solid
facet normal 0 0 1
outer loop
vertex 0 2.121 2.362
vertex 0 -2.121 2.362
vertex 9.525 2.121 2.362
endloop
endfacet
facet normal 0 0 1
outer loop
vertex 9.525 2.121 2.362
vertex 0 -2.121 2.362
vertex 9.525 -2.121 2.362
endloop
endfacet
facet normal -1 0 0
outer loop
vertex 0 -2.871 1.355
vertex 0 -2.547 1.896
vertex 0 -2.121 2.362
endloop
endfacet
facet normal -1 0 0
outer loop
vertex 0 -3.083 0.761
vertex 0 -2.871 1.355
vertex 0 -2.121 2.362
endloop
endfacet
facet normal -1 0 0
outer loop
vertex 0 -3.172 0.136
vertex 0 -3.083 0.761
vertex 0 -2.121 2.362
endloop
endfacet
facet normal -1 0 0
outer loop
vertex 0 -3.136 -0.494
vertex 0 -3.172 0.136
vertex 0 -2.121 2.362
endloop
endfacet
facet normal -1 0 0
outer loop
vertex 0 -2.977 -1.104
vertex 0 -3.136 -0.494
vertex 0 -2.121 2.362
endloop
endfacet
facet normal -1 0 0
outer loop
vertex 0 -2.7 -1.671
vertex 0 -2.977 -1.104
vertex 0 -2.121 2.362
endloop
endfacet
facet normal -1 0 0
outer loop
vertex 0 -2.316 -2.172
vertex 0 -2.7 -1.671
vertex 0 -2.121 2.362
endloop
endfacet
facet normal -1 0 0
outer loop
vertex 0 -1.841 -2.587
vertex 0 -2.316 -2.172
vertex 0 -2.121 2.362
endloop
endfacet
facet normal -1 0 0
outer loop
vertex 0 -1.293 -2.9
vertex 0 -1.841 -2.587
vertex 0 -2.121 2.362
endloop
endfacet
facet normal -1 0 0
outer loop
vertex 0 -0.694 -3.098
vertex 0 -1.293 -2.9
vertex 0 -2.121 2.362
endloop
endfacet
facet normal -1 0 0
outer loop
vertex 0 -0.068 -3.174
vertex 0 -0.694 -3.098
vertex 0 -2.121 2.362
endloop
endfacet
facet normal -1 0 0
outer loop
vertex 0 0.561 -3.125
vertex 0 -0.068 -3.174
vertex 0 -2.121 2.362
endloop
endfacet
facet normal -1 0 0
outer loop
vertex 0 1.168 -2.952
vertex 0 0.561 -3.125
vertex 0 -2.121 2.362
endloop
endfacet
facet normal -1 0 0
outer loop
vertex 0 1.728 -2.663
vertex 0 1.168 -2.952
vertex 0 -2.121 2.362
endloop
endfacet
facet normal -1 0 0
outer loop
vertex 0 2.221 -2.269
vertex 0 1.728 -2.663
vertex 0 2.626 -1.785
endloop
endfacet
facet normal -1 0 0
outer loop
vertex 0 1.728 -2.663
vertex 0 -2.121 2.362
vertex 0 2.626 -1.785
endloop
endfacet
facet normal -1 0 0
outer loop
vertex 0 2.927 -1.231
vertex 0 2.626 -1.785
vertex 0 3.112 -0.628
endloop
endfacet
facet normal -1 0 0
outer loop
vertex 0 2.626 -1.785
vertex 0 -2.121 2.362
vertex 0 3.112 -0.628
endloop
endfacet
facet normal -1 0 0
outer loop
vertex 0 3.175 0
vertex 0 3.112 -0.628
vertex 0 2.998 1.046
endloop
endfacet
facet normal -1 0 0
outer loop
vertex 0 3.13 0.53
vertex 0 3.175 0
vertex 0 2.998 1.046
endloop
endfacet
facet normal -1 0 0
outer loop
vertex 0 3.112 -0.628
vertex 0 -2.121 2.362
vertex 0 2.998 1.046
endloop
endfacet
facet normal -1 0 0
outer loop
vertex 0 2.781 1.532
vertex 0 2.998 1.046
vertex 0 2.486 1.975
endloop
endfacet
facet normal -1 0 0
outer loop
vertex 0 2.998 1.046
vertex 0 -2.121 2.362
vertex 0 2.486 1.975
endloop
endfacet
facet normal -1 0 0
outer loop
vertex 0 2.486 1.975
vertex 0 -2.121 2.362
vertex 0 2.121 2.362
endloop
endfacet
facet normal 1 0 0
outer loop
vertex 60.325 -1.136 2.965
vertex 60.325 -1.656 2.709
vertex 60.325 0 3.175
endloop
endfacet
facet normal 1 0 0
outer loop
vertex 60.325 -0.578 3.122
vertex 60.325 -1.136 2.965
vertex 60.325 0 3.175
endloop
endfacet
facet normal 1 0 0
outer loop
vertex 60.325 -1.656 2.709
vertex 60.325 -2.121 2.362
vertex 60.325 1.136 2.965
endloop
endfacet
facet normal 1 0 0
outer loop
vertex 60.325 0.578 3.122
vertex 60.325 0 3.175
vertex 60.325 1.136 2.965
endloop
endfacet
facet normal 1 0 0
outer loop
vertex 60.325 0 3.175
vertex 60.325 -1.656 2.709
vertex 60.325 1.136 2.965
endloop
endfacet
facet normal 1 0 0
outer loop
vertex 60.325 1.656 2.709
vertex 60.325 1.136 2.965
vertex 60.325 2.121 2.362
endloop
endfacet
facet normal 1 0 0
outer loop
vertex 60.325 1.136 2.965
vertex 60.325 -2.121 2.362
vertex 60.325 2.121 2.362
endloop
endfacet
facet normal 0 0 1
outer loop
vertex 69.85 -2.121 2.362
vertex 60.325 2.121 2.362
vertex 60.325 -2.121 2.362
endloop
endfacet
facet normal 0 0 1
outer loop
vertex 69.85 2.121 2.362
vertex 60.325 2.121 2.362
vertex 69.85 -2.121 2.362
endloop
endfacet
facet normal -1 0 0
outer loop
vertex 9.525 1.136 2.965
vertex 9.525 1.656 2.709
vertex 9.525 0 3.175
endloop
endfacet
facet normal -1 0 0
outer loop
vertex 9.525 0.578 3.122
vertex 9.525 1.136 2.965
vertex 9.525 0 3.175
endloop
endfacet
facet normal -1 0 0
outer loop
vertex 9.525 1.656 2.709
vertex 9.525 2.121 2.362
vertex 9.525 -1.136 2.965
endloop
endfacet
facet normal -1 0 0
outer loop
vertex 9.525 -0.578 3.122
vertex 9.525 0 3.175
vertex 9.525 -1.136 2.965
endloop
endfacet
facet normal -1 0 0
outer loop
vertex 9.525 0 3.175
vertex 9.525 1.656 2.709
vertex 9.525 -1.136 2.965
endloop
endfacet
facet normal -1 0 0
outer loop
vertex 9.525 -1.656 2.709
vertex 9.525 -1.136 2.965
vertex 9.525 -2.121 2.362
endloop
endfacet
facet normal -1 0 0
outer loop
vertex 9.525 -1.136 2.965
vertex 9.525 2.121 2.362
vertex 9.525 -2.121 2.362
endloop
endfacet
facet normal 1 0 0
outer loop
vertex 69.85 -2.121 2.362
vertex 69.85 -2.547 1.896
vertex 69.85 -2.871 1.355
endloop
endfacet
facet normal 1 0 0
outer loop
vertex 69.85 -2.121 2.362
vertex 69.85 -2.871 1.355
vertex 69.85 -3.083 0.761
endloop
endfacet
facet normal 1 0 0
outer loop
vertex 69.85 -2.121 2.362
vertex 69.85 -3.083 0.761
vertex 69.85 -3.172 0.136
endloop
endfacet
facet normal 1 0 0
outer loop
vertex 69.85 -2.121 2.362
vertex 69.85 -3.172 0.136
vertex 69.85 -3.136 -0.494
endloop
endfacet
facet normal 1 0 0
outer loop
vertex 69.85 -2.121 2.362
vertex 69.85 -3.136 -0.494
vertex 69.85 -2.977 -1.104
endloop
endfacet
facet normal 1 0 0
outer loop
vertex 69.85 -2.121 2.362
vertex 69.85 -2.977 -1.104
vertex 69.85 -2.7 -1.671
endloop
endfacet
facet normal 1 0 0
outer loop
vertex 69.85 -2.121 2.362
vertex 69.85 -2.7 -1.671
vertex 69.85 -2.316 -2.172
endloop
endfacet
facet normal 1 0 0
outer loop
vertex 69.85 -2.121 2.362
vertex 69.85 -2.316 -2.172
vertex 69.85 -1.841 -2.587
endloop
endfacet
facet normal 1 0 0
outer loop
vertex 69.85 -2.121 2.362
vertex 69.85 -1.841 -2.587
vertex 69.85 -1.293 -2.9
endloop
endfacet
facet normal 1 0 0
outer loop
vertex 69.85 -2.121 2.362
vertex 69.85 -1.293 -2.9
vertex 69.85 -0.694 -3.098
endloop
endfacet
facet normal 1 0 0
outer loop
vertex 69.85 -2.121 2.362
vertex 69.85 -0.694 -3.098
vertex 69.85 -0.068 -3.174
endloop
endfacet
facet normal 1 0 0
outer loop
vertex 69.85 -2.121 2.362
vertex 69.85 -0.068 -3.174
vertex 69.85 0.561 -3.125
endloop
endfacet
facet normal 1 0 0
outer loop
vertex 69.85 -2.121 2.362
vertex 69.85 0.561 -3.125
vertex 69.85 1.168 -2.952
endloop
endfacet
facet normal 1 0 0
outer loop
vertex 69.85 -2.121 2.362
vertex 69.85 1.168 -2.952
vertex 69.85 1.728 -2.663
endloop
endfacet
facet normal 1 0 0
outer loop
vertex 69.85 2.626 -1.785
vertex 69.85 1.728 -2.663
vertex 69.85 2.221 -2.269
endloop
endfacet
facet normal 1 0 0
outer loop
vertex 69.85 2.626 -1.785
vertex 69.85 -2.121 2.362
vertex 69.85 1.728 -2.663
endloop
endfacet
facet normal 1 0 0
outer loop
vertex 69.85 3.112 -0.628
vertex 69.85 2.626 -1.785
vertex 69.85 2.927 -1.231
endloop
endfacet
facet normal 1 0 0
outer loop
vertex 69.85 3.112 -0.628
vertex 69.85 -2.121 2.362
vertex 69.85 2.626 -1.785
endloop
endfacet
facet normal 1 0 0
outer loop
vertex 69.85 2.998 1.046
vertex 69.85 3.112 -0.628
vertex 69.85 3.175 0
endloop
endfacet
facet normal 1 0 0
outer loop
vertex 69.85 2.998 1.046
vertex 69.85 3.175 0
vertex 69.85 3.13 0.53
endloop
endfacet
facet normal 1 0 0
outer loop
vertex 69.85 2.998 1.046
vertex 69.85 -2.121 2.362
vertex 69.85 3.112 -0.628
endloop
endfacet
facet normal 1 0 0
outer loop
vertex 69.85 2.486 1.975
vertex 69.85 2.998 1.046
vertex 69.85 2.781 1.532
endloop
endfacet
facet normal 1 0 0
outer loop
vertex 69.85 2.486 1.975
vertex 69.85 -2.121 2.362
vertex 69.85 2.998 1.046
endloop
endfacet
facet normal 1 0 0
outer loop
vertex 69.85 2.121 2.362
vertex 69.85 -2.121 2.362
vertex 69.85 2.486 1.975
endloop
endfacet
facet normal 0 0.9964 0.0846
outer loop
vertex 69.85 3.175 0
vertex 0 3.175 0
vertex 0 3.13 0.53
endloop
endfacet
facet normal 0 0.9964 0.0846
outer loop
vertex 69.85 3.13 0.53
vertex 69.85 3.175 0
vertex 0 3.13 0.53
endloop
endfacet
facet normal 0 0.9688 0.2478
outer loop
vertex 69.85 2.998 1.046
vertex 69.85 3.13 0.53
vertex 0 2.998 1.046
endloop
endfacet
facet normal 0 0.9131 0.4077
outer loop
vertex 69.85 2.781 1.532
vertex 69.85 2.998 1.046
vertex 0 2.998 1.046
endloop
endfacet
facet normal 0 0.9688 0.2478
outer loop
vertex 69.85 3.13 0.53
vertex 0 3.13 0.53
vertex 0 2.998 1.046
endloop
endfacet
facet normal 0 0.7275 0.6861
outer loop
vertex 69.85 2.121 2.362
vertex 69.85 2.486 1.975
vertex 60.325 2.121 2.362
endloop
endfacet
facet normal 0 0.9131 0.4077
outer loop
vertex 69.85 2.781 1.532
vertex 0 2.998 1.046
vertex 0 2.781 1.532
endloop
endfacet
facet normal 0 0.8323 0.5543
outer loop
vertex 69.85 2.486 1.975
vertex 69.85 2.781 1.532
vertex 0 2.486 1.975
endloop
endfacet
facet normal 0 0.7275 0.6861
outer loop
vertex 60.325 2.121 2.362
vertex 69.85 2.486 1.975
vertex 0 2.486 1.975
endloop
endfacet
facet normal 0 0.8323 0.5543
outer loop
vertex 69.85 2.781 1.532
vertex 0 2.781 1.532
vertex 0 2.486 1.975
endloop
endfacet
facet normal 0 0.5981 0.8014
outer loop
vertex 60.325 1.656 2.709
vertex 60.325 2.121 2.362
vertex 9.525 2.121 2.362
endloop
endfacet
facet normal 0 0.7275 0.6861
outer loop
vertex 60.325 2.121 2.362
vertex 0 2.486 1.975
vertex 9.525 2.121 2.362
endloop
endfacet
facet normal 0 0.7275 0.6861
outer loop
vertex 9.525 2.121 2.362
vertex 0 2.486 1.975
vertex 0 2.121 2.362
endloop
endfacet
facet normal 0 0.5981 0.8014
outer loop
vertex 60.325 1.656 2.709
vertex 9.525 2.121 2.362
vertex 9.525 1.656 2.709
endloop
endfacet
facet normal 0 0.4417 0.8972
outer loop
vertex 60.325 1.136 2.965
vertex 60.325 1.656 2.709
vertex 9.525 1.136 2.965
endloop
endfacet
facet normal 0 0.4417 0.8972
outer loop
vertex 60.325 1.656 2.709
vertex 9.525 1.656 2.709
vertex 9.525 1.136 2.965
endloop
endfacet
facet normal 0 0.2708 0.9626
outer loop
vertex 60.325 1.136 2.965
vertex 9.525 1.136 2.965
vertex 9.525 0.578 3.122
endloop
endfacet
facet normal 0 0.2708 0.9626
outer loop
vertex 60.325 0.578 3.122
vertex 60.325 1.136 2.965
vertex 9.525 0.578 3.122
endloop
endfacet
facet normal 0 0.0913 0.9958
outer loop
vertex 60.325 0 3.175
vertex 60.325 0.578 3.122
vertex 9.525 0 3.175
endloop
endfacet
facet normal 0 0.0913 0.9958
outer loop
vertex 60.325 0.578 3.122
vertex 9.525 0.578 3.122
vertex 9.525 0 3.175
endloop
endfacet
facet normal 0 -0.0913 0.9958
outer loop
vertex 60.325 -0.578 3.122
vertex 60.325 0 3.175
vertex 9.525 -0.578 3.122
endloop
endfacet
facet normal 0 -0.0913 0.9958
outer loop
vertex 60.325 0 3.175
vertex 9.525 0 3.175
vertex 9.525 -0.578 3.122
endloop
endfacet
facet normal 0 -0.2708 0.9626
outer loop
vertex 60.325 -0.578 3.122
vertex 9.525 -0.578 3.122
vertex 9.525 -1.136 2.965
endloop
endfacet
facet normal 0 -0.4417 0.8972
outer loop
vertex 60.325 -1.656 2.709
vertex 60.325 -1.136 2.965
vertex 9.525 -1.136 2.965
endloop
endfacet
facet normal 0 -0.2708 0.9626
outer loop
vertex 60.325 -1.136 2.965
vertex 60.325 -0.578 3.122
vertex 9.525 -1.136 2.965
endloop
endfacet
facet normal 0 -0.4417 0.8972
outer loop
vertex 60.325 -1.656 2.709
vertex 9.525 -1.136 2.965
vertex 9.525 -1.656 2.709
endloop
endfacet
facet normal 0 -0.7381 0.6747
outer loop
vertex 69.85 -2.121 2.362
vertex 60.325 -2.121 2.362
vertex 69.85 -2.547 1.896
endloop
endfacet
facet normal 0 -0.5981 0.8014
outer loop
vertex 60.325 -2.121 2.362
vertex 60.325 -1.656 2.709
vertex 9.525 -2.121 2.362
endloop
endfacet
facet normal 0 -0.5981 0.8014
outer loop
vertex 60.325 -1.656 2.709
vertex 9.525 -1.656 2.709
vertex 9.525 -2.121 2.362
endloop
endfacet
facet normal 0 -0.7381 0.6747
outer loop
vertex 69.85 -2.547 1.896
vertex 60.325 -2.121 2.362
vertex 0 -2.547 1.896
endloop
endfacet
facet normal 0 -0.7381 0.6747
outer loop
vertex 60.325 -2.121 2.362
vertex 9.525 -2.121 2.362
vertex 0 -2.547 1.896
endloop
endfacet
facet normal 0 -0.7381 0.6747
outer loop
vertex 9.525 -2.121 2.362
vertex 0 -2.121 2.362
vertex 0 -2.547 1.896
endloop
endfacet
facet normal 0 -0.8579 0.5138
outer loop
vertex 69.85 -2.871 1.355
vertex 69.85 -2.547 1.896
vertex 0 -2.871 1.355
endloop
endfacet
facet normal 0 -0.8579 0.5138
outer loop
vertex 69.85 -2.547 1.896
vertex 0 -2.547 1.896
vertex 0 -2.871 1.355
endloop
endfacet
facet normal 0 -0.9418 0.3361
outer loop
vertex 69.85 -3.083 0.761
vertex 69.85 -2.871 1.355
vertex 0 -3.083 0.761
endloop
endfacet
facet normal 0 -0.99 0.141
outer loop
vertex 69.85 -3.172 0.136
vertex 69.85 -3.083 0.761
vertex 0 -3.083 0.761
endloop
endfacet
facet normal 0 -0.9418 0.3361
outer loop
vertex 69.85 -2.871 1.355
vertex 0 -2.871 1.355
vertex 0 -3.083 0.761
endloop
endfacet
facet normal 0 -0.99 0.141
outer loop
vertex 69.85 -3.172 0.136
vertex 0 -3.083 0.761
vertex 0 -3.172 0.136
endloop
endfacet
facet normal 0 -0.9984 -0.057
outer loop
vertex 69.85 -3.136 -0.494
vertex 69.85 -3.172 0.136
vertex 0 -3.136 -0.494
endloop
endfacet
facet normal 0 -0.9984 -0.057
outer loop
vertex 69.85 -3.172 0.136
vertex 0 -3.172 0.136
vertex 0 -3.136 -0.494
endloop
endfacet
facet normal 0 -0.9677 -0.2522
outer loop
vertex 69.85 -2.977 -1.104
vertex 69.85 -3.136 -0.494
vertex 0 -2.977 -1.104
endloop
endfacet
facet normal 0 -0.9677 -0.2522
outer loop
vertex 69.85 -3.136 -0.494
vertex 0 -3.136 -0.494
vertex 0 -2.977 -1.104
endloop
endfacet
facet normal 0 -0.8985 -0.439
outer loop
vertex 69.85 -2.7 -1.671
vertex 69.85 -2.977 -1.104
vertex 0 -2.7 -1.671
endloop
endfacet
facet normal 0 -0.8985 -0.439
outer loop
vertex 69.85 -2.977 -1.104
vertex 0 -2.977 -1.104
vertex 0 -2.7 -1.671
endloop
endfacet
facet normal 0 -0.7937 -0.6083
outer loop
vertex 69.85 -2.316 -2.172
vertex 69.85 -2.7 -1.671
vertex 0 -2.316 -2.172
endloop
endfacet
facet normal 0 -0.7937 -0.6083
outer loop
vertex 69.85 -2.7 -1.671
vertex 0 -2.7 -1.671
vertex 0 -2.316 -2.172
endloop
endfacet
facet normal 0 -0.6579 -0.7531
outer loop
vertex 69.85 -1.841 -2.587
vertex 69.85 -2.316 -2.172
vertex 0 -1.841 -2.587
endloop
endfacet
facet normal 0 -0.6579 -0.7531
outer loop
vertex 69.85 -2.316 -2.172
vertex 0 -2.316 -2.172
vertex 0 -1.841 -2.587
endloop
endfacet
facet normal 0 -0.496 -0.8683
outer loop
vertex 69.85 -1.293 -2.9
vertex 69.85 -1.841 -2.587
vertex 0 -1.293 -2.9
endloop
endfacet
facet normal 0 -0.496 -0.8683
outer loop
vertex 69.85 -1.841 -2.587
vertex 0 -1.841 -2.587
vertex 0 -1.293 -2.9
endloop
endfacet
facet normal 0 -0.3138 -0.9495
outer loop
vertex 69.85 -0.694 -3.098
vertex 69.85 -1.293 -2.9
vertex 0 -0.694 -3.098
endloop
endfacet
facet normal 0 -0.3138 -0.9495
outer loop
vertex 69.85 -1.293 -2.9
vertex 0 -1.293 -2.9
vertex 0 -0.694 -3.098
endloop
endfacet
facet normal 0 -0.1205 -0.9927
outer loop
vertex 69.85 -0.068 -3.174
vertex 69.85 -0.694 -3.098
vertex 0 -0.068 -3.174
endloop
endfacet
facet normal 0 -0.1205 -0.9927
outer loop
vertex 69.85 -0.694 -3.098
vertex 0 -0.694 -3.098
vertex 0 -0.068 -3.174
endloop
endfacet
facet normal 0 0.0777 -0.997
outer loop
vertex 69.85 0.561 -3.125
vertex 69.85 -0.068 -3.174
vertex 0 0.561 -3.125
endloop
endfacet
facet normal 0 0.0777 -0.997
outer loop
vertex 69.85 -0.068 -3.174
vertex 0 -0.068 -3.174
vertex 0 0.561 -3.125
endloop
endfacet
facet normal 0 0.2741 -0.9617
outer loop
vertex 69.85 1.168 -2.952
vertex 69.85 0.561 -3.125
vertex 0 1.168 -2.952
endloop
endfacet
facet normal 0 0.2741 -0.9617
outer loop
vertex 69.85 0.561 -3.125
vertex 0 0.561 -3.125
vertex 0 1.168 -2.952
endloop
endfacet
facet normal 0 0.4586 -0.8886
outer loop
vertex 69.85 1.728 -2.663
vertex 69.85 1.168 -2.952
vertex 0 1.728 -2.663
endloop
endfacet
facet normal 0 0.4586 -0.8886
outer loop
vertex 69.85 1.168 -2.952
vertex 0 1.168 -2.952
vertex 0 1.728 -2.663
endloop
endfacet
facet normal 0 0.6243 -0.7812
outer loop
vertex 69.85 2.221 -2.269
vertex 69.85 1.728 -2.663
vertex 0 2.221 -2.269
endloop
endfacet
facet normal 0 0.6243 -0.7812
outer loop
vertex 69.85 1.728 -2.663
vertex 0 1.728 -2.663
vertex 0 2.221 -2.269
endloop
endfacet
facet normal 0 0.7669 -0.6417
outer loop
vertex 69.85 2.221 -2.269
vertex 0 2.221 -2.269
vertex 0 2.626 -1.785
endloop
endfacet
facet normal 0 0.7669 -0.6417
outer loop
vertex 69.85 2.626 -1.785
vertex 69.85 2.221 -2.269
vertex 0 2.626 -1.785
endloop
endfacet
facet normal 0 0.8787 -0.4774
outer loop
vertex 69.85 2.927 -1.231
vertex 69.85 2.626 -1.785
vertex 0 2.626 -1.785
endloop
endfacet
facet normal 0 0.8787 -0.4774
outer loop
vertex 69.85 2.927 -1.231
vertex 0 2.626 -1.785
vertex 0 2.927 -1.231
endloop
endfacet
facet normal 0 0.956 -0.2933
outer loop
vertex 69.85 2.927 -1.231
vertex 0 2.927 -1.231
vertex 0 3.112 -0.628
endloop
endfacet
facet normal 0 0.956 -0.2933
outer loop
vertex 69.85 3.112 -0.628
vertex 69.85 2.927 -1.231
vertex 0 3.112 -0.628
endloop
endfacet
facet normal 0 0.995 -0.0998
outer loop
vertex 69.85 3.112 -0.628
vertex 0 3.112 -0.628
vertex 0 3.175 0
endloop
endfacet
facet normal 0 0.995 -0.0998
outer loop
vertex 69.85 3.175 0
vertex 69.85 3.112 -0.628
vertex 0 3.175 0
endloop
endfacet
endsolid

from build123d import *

# Parameters (mm, degrees)
F0_R     = 3.175
F1_DEPTH = 69.85
F2_W     = 9.525
F2_H     = 0.8128
F3_DEPTH = 12.7


with BuildPart() as f1:
    # F0 (on Right) → F1 (new body)
    with BuildSketch(Plane.YZ):
        Circle(F0_R)
    extrude(amount=F1_DEPTH)

    # F2 (on Front) → F3 (cut, symmetric)
    with BuildSketch(Plane.XZ):
        with Locations((65.0875, 2.7686)):
            Rectangle(F2_W, F2_H)
        with Locations((4.7625, 2.7686)):
            Rectangle(F2_W, F2_H)
    extrude(amount=F3_DEPTH, both=True, mode=Mode.SUBTRACT)


solid = f1.part
